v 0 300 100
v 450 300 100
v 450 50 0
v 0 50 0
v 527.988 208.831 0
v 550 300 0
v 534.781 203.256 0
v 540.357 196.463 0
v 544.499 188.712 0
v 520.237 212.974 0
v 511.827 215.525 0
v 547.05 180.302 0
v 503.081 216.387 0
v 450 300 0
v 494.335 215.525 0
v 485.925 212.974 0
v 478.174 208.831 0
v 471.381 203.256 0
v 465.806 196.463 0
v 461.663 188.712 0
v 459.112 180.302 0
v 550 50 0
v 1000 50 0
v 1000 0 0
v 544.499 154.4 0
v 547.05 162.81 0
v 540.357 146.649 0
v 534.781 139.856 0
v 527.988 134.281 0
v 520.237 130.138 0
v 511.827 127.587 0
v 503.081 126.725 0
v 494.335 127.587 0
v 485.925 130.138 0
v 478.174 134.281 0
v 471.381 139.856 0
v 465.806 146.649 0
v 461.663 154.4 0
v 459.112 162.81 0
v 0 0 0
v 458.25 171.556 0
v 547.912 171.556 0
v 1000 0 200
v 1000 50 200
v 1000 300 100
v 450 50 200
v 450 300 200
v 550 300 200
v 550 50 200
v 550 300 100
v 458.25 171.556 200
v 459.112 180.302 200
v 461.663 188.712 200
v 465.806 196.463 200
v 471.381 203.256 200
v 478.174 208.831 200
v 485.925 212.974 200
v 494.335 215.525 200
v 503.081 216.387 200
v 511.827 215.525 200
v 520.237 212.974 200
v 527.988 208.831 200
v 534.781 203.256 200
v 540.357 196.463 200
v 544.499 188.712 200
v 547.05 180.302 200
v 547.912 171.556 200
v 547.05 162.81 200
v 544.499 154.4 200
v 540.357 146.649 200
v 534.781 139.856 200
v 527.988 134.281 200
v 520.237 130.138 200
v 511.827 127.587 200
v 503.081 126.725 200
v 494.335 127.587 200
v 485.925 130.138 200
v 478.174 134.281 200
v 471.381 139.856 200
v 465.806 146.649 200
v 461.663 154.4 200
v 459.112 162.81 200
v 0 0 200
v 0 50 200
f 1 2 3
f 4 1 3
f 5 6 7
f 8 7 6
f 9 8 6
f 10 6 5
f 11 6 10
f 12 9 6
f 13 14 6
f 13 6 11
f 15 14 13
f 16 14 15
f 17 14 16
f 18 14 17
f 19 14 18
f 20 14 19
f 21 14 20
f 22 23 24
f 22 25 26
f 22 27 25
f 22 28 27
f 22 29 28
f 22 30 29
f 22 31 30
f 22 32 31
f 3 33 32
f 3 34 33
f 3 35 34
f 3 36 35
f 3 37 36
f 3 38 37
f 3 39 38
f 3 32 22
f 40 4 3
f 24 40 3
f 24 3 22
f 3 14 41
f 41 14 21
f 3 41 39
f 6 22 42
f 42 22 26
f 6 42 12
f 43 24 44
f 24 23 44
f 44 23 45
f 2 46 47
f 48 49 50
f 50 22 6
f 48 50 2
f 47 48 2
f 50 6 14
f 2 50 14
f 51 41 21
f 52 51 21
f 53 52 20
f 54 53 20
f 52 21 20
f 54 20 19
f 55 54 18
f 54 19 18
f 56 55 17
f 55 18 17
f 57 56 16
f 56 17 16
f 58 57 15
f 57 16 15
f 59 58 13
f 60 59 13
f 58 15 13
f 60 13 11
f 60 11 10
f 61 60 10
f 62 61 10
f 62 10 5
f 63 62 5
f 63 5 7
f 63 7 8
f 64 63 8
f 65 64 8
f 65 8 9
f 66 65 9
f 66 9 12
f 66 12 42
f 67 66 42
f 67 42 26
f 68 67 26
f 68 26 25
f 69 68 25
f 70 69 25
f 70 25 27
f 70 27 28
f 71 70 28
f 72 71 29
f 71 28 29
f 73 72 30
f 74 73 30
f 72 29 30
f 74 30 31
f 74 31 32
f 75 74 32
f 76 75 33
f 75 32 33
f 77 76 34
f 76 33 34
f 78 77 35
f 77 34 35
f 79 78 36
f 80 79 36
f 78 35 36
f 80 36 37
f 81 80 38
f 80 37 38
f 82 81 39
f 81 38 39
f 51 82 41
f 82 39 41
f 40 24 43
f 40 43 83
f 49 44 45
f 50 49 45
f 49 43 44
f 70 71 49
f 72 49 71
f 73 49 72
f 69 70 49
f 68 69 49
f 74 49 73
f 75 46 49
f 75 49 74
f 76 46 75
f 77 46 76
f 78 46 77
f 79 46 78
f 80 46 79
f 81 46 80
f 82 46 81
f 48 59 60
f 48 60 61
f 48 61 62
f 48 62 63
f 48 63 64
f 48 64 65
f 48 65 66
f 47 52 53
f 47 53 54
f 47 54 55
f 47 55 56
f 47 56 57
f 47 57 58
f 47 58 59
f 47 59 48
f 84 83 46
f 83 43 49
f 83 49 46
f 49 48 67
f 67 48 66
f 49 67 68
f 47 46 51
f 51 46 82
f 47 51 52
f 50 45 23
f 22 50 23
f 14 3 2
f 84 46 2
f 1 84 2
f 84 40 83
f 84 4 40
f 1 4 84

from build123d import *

# Parameters (mm, degrees)
BOSS_EXTRUDE1_DEPTH     = 1000
SKETCH2_W               = 100
SKETCH2_H               = 300
BOSS_EXTRUDE2_DEPTH     = 200
SKETCH3_R               = 44.830840268
CUT_EXTRUDE1_DEPTH      = 1
CUT_EXTRUDE1_DEPTH_BACK = 201


with BuildPart() as part:
    # Sketch1 → Boss-Extrude1 (new body)
    with BuildSketch(Plane(origin=(0, 0, 0), x_dir=(0, 0, -1), z_dir=(1, 0, 0))):
        Polygon((0, 0), (-200, 0), (-200, 50), (-100, 300), (0, 50), align=None)
    extrude(amount=BOSS_EXTRUDE1_DEPTH)

    # Sketch2 → Boss-Extrude2 (add)
    with BuildSketch(Plane(origin=(0, 0, 0), x_dir=(-1, 0, 0), z_dir=(0, 0, -1))):
        with Locations((-500, 150)):
            Rectangle(SKETCH2_W, SKETCH2_H)
    extrude(amount=-BOSS_EXTRUDE2_DEPTH)

    # Sketch3 → Cut-Extrude1 (cut, two sides)
    with BuildSketch(Plane(origin=(0, 0, 0), x_dir=(-1, 0, 0), z_dir=(0, 0, -1))) as cut_extrude1_sk:
        with Locations((-503.081055297, 171.556016762)):
            Circle(SKETCH3_R)
    extrude(amount=CUT_EXTRUDE1_DEPTH, mode=Mode.SUBTRACT)
    extrude(cut_extrude1_sk.sketch, amount=-CUT_EXTRUDE1_DEPTH_BACK, mode=Mode.SUBTRACT)


solid = part.part
